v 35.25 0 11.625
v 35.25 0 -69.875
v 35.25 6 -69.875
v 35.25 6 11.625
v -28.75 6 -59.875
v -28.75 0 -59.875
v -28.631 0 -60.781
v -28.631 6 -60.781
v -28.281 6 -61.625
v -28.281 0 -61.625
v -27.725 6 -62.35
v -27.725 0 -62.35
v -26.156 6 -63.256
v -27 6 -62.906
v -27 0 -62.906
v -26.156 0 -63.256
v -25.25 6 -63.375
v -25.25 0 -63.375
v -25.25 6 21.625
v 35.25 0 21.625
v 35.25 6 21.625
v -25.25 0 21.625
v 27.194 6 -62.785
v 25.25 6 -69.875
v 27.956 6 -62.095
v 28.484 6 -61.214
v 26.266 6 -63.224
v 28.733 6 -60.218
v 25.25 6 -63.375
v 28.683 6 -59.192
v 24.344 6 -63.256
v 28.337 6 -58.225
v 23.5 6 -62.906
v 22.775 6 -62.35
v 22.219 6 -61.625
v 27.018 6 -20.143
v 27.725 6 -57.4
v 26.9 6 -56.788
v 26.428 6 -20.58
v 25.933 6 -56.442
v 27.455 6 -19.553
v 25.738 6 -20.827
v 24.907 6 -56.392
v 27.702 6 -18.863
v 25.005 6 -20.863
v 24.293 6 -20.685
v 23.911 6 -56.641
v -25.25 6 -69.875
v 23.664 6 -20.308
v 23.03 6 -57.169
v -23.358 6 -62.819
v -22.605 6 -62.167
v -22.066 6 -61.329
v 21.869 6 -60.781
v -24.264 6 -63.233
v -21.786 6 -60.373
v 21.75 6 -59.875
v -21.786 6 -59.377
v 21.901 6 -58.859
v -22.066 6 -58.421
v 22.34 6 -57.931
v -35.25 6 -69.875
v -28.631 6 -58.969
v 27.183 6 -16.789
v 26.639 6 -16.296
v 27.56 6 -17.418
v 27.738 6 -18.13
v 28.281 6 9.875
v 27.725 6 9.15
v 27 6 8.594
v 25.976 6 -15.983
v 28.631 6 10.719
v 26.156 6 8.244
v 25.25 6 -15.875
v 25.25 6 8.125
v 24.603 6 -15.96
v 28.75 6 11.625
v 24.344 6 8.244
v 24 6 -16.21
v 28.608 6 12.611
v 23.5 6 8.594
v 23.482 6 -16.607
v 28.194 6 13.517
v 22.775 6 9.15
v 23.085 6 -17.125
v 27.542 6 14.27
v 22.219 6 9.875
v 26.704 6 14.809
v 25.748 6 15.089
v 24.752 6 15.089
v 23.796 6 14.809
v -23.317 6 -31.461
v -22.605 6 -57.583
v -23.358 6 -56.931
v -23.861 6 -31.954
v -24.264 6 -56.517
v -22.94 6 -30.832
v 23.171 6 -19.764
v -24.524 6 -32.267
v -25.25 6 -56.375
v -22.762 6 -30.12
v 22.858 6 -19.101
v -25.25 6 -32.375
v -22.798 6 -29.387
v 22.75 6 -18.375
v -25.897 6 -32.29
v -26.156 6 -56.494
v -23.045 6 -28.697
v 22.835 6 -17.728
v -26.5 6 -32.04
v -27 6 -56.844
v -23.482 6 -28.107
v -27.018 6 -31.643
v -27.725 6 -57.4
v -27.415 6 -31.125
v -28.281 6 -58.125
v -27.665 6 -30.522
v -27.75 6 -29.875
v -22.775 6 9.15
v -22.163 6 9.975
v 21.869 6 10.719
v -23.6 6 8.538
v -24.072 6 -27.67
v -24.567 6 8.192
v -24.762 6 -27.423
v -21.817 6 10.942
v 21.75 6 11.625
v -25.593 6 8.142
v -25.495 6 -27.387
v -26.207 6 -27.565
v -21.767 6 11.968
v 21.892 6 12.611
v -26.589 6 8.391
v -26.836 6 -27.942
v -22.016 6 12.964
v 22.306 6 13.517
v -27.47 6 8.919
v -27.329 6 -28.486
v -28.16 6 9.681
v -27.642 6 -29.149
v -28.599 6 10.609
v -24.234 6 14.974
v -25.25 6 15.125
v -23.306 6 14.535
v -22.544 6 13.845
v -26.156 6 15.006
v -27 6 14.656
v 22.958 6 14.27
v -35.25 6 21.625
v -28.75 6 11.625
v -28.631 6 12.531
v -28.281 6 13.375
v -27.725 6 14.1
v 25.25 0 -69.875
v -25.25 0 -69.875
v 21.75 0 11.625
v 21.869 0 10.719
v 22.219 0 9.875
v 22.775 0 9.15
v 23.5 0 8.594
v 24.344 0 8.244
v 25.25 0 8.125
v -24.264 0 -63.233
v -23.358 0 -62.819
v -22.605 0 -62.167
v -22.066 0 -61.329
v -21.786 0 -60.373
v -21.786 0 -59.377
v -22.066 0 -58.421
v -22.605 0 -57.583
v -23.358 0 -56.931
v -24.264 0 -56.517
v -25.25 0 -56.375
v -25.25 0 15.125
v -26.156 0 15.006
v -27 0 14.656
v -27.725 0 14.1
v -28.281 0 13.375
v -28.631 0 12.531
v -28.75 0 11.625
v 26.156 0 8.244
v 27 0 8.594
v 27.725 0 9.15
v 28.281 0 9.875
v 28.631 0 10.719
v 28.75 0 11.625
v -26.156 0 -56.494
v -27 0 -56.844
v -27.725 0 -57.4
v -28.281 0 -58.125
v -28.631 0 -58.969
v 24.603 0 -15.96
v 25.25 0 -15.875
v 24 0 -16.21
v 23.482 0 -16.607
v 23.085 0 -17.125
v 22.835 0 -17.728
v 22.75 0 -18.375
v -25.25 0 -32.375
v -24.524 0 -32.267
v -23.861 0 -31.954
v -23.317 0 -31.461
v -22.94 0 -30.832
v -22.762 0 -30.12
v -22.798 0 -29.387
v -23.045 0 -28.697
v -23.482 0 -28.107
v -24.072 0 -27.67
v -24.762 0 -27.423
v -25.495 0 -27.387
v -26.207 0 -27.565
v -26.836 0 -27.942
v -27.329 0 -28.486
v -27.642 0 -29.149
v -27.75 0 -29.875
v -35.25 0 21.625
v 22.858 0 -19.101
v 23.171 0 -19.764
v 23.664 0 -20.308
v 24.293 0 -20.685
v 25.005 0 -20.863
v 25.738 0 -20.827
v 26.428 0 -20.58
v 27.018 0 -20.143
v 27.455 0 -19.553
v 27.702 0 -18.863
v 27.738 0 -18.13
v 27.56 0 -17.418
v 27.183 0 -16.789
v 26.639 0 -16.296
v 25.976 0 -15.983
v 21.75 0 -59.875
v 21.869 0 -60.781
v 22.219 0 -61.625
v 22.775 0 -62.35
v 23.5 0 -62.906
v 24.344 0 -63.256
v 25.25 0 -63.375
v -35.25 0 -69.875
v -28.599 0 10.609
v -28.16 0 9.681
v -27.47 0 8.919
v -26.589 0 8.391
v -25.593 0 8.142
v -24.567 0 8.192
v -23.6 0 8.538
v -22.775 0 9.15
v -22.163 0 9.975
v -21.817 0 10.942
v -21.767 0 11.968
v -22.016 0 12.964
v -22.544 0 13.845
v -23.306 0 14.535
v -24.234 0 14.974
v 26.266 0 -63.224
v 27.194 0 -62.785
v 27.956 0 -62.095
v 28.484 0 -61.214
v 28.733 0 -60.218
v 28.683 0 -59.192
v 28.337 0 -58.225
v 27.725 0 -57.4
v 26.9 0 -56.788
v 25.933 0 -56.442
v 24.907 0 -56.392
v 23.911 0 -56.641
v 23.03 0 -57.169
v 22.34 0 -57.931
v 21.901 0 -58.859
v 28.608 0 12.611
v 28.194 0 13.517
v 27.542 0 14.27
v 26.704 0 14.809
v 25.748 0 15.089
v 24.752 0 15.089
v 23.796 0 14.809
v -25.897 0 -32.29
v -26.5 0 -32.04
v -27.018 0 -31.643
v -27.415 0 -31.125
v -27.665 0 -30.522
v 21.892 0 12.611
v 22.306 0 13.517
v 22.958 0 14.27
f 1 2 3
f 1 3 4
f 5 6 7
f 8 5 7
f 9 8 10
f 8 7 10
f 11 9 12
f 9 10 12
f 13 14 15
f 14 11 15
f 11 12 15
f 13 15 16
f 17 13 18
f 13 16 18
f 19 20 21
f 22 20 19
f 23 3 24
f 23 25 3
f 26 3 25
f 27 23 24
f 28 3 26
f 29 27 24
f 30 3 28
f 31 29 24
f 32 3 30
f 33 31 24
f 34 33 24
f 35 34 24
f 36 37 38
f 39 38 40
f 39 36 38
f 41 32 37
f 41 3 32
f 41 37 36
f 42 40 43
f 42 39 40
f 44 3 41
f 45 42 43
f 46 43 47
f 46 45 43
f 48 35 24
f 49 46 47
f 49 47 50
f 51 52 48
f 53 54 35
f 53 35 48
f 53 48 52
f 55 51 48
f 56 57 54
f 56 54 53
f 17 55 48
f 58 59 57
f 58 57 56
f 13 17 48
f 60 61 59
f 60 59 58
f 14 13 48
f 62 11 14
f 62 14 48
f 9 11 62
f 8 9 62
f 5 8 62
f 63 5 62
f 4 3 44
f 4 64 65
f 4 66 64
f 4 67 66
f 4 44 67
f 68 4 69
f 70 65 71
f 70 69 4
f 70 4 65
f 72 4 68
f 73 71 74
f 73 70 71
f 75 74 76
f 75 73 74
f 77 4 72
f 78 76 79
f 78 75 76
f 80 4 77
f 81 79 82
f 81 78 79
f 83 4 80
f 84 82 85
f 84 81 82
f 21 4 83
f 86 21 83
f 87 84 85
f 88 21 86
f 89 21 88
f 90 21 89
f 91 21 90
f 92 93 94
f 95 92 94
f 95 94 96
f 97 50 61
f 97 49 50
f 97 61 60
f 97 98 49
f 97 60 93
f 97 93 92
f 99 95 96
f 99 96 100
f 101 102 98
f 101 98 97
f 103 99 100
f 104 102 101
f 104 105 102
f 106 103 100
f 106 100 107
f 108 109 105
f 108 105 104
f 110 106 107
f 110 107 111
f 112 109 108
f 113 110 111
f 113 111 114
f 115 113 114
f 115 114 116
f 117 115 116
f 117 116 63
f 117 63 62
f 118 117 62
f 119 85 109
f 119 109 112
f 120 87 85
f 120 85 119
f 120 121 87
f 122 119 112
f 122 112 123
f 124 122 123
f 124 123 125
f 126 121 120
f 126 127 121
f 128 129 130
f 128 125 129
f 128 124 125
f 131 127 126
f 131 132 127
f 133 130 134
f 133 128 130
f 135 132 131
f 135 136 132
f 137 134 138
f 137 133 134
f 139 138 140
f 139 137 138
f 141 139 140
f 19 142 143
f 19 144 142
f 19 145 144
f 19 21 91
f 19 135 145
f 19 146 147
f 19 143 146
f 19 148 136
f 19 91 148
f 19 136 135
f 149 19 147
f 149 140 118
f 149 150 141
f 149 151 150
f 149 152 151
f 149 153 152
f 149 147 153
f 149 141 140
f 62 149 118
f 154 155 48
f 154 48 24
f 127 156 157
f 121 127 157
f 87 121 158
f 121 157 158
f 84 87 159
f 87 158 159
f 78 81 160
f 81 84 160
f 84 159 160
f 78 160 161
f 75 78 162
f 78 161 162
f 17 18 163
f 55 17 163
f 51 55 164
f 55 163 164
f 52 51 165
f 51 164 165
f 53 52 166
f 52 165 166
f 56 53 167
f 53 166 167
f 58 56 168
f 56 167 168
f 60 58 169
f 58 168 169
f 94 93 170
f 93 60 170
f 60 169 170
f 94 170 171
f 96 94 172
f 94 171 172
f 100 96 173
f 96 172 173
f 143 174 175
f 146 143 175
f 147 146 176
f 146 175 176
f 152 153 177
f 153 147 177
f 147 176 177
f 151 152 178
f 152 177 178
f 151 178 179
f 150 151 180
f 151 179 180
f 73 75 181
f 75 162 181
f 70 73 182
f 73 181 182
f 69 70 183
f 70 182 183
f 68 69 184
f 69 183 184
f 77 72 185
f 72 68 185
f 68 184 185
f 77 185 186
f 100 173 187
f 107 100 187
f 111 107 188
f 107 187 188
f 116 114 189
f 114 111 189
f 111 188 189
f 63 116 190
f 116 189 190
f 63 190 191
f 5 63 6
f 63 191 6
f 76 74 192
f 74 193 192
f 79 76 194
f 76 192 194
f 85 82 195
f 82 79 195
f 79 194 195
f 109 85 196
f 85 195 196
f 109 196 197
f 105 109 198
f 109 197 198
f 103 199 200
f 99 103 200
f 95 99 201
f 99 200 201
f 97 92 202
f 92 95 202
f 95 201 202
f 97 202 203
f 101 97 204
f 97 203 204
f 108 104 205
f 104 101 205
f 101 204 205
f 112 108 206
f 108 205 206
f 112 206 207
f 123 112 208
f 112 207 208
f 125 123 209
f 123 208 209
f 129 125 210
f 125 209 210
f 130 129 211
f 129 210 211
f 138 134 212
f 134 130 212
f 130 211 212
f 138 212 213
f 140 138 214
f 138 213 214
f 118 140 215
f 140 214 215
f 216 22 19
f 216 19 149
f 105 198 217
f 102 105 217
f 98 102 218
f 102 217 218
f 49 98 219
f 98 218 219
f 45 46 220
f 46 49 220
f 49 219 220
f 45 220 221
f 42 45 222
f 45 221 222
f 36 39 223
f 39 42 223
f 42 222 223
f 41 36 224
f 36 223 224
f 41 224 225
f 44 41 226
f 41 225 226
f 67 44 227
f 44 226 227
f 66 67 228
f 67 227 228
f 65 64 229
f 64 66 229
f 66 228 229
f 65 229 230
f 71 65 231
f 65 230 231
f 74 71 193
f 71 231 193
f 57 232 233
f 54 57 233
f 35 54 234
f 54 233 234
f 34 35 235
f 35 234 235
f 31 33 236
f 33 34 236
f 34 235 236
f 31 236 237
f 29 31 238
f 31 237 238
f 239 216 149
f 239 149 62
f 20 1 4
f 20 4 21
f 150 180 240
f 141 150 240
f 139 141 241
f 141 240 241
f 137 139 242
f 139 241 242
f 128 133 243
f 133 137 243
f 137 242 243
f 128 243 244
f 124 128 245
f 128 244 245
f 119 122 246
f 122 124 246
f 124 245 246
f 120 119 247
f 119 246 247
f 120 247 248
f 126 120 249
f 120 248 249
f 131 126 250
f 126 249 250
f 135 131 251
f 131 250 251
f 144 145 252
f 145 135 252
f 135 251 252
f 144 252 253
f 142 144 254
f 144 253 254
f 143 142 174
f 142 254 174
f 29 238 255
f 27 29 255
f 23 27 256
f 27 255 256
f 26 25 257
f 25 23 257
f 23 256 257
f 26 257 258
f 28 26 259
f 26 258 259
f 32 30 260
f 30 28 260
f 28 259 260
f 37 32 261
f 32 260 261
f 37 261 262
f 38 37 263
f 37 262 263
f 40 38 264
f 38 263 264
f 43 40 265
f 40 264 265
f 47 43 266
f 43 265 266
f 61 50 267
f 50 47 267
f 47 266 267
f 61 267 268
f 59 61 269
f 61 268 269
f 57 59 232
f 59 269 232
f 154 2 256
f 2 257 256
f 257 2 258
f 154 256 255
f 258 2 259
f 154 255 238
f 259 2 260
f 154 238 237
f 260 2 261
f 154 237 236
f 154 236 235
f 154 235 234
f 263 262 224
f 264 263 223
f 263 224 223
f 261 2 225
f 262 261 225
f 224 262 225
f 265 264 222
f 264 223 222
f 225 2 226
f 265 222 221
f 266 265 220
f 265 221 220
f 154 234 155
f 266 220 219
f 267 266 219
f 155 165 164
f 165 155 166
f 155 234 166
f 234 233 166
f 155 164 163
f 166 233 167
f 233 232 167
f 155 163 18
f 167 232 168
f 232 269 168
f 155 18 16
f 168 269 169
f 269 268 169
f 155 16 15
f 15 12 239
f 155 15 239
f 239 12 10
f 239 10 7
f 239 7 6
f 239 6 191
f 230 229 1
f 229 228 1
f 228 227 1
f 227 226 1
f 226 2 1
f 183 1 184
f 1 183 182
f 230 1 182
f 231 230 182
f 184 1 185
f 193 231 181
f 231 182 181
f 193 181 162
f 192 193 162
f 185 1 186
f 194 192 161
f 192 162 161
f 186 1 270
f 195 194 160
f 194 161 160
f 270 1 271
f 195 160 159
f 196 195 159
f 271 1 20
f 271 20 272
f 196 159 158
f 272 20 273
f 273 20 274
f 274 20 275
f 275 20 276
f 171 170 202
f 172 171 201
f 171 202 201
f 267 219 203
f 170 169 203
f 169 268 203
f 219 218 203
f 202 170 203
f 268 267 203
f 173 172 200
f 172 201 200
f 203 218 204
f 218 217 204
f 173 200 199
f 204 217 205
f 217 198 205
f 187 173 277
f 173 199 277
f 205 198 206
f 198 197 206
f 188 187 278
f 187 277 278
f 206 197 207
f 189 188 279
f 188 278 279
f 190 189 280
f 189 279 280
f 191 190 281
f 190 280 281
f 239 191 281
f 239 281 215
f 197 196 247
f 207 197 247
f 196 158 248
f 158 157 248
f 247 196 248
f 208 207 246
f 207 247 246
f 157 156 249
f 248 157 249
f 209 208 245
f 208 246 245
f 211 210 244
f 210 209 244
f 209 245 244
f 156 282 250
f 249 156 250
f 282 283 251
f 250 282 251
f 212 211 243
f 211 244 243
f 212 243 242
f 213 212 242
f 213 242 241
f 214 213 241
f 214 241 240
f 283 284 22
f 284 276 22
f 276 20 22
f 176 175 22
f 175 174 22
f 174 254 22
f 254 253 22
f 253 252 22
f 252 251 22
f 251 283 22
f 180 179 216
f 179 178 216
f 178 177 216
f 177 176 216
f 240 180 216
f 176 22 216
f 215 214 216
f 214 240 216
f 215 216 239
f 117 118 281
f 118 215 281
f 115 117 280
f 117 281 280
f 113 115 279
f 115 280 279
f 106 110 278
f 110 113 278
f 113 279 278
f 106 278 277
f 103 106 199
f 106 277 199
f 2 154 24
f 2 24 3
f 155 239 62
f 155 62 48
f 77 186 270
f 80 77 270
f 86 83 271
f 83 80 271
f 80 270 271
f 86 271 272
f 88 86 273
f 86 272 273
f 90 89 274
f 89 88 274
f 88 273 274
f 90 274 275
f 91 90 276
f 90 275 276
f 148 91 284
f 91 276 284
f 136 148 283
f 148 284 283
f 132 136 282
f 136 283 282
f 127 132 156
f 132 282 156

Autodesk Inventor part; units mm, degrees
ref_plane "YZ Plane" through (0, 0, 0) normal (1, 0, 0) x (0, 1, 0)
ref_plane "XZ Plane" through (0, 0, 0) normal (0, 1, 0) x (-1, 0, 0)
ref_plane "XY Plane" through (0, 0, 0) normal (0, 0, 1) x (1, 0, 0)
sketch "Sketch1" plane through (0, 0, 0) normal (0, 1, 0) x (-1, 0, 0)
  line L0 (-14, -58.75) -> (-19, -58.75)
  line L1 (-35.25, 21.625) -> (35.25, 21.625)
  line L2 (-35.25, 21.625) -> (35.25, 21.625) construction
  line L3 (35.25, 21.625) -> (25.25, 21.625)
  line L4 (-35.25, 21.625) -> (35.25, 21.625)
  line L5 (35.25, 21.625) -> (35.25, -69.875)
  line L6 (35.25, -69.875) -> (-35.25, -69.875)
  line L7 (-35.25, -69.875) -> (-35.25, 21.625)
  line L8 (-35.25, 21.625) -> (-35.25, 11.625)
  line L9 (-35.25, 11.625) -> (-25.25, 11.625)
  circle A0 centre (-25.25, 11.625) radius 3.5
  line L10 (35.25, 21.625) -> (25.25, 21.625)
  line L11 (25.25, 21.625) -> (25.25, 11.625)
  circle A1 centre (25.25, 11.625) radius 3.5
  line L12 (35.25, -69.875) -> (25.25, -69.875)
  line L13 (25.25, -69.875) -> (25.25, -59.875)
  circle A2 centre (25.25, -59.875) radius 3.5
  line L14 (-35.25, -69.875) -> (-25.25, -69.875)
  line L15 (-25.25, -69.875) -> (-25.25, -59.875)
  circle A3 centre (-25.25, -59.875) radius 3.5
  line L16 (-25.25, 11.625) -> (-25.25, -18.375)
  line L17 (25.25, -59.875) -> (25.25, -29.875)
  circle A4 centre (-25.25, -18.375) radius 2.5
  circle A5 centre (25.25, -29.875) radius 2.5
  point P0 (0, 0)
  dimension "d6" = 5
  dimension "d9" = 70.5
  dimension "d41" = 70.5
  dimension "d42" = 91.5
  dimension "d43" = 10
  dimension "d44" = 10
  dimension "d45" = 7
  dimension "d46" = 10
  dimension "d47" = 10
  dimension "d48" = 90
  dimension "d50" = 7
  dimension "d51" = 10
  dimension "d52" = 10
  dimension "d53" = 7
  dimension "d54" = 10
  dimension "d55" = 10
  dimension "d56" = 7
  dimension "d60" = 30
  dimension "d61" = 30
  dimension "d62" = 5
  dimension "d63" = 5
extrude "Extrusion1" add sketch "Sketch1" along normal blind 6
properties part number "m"
